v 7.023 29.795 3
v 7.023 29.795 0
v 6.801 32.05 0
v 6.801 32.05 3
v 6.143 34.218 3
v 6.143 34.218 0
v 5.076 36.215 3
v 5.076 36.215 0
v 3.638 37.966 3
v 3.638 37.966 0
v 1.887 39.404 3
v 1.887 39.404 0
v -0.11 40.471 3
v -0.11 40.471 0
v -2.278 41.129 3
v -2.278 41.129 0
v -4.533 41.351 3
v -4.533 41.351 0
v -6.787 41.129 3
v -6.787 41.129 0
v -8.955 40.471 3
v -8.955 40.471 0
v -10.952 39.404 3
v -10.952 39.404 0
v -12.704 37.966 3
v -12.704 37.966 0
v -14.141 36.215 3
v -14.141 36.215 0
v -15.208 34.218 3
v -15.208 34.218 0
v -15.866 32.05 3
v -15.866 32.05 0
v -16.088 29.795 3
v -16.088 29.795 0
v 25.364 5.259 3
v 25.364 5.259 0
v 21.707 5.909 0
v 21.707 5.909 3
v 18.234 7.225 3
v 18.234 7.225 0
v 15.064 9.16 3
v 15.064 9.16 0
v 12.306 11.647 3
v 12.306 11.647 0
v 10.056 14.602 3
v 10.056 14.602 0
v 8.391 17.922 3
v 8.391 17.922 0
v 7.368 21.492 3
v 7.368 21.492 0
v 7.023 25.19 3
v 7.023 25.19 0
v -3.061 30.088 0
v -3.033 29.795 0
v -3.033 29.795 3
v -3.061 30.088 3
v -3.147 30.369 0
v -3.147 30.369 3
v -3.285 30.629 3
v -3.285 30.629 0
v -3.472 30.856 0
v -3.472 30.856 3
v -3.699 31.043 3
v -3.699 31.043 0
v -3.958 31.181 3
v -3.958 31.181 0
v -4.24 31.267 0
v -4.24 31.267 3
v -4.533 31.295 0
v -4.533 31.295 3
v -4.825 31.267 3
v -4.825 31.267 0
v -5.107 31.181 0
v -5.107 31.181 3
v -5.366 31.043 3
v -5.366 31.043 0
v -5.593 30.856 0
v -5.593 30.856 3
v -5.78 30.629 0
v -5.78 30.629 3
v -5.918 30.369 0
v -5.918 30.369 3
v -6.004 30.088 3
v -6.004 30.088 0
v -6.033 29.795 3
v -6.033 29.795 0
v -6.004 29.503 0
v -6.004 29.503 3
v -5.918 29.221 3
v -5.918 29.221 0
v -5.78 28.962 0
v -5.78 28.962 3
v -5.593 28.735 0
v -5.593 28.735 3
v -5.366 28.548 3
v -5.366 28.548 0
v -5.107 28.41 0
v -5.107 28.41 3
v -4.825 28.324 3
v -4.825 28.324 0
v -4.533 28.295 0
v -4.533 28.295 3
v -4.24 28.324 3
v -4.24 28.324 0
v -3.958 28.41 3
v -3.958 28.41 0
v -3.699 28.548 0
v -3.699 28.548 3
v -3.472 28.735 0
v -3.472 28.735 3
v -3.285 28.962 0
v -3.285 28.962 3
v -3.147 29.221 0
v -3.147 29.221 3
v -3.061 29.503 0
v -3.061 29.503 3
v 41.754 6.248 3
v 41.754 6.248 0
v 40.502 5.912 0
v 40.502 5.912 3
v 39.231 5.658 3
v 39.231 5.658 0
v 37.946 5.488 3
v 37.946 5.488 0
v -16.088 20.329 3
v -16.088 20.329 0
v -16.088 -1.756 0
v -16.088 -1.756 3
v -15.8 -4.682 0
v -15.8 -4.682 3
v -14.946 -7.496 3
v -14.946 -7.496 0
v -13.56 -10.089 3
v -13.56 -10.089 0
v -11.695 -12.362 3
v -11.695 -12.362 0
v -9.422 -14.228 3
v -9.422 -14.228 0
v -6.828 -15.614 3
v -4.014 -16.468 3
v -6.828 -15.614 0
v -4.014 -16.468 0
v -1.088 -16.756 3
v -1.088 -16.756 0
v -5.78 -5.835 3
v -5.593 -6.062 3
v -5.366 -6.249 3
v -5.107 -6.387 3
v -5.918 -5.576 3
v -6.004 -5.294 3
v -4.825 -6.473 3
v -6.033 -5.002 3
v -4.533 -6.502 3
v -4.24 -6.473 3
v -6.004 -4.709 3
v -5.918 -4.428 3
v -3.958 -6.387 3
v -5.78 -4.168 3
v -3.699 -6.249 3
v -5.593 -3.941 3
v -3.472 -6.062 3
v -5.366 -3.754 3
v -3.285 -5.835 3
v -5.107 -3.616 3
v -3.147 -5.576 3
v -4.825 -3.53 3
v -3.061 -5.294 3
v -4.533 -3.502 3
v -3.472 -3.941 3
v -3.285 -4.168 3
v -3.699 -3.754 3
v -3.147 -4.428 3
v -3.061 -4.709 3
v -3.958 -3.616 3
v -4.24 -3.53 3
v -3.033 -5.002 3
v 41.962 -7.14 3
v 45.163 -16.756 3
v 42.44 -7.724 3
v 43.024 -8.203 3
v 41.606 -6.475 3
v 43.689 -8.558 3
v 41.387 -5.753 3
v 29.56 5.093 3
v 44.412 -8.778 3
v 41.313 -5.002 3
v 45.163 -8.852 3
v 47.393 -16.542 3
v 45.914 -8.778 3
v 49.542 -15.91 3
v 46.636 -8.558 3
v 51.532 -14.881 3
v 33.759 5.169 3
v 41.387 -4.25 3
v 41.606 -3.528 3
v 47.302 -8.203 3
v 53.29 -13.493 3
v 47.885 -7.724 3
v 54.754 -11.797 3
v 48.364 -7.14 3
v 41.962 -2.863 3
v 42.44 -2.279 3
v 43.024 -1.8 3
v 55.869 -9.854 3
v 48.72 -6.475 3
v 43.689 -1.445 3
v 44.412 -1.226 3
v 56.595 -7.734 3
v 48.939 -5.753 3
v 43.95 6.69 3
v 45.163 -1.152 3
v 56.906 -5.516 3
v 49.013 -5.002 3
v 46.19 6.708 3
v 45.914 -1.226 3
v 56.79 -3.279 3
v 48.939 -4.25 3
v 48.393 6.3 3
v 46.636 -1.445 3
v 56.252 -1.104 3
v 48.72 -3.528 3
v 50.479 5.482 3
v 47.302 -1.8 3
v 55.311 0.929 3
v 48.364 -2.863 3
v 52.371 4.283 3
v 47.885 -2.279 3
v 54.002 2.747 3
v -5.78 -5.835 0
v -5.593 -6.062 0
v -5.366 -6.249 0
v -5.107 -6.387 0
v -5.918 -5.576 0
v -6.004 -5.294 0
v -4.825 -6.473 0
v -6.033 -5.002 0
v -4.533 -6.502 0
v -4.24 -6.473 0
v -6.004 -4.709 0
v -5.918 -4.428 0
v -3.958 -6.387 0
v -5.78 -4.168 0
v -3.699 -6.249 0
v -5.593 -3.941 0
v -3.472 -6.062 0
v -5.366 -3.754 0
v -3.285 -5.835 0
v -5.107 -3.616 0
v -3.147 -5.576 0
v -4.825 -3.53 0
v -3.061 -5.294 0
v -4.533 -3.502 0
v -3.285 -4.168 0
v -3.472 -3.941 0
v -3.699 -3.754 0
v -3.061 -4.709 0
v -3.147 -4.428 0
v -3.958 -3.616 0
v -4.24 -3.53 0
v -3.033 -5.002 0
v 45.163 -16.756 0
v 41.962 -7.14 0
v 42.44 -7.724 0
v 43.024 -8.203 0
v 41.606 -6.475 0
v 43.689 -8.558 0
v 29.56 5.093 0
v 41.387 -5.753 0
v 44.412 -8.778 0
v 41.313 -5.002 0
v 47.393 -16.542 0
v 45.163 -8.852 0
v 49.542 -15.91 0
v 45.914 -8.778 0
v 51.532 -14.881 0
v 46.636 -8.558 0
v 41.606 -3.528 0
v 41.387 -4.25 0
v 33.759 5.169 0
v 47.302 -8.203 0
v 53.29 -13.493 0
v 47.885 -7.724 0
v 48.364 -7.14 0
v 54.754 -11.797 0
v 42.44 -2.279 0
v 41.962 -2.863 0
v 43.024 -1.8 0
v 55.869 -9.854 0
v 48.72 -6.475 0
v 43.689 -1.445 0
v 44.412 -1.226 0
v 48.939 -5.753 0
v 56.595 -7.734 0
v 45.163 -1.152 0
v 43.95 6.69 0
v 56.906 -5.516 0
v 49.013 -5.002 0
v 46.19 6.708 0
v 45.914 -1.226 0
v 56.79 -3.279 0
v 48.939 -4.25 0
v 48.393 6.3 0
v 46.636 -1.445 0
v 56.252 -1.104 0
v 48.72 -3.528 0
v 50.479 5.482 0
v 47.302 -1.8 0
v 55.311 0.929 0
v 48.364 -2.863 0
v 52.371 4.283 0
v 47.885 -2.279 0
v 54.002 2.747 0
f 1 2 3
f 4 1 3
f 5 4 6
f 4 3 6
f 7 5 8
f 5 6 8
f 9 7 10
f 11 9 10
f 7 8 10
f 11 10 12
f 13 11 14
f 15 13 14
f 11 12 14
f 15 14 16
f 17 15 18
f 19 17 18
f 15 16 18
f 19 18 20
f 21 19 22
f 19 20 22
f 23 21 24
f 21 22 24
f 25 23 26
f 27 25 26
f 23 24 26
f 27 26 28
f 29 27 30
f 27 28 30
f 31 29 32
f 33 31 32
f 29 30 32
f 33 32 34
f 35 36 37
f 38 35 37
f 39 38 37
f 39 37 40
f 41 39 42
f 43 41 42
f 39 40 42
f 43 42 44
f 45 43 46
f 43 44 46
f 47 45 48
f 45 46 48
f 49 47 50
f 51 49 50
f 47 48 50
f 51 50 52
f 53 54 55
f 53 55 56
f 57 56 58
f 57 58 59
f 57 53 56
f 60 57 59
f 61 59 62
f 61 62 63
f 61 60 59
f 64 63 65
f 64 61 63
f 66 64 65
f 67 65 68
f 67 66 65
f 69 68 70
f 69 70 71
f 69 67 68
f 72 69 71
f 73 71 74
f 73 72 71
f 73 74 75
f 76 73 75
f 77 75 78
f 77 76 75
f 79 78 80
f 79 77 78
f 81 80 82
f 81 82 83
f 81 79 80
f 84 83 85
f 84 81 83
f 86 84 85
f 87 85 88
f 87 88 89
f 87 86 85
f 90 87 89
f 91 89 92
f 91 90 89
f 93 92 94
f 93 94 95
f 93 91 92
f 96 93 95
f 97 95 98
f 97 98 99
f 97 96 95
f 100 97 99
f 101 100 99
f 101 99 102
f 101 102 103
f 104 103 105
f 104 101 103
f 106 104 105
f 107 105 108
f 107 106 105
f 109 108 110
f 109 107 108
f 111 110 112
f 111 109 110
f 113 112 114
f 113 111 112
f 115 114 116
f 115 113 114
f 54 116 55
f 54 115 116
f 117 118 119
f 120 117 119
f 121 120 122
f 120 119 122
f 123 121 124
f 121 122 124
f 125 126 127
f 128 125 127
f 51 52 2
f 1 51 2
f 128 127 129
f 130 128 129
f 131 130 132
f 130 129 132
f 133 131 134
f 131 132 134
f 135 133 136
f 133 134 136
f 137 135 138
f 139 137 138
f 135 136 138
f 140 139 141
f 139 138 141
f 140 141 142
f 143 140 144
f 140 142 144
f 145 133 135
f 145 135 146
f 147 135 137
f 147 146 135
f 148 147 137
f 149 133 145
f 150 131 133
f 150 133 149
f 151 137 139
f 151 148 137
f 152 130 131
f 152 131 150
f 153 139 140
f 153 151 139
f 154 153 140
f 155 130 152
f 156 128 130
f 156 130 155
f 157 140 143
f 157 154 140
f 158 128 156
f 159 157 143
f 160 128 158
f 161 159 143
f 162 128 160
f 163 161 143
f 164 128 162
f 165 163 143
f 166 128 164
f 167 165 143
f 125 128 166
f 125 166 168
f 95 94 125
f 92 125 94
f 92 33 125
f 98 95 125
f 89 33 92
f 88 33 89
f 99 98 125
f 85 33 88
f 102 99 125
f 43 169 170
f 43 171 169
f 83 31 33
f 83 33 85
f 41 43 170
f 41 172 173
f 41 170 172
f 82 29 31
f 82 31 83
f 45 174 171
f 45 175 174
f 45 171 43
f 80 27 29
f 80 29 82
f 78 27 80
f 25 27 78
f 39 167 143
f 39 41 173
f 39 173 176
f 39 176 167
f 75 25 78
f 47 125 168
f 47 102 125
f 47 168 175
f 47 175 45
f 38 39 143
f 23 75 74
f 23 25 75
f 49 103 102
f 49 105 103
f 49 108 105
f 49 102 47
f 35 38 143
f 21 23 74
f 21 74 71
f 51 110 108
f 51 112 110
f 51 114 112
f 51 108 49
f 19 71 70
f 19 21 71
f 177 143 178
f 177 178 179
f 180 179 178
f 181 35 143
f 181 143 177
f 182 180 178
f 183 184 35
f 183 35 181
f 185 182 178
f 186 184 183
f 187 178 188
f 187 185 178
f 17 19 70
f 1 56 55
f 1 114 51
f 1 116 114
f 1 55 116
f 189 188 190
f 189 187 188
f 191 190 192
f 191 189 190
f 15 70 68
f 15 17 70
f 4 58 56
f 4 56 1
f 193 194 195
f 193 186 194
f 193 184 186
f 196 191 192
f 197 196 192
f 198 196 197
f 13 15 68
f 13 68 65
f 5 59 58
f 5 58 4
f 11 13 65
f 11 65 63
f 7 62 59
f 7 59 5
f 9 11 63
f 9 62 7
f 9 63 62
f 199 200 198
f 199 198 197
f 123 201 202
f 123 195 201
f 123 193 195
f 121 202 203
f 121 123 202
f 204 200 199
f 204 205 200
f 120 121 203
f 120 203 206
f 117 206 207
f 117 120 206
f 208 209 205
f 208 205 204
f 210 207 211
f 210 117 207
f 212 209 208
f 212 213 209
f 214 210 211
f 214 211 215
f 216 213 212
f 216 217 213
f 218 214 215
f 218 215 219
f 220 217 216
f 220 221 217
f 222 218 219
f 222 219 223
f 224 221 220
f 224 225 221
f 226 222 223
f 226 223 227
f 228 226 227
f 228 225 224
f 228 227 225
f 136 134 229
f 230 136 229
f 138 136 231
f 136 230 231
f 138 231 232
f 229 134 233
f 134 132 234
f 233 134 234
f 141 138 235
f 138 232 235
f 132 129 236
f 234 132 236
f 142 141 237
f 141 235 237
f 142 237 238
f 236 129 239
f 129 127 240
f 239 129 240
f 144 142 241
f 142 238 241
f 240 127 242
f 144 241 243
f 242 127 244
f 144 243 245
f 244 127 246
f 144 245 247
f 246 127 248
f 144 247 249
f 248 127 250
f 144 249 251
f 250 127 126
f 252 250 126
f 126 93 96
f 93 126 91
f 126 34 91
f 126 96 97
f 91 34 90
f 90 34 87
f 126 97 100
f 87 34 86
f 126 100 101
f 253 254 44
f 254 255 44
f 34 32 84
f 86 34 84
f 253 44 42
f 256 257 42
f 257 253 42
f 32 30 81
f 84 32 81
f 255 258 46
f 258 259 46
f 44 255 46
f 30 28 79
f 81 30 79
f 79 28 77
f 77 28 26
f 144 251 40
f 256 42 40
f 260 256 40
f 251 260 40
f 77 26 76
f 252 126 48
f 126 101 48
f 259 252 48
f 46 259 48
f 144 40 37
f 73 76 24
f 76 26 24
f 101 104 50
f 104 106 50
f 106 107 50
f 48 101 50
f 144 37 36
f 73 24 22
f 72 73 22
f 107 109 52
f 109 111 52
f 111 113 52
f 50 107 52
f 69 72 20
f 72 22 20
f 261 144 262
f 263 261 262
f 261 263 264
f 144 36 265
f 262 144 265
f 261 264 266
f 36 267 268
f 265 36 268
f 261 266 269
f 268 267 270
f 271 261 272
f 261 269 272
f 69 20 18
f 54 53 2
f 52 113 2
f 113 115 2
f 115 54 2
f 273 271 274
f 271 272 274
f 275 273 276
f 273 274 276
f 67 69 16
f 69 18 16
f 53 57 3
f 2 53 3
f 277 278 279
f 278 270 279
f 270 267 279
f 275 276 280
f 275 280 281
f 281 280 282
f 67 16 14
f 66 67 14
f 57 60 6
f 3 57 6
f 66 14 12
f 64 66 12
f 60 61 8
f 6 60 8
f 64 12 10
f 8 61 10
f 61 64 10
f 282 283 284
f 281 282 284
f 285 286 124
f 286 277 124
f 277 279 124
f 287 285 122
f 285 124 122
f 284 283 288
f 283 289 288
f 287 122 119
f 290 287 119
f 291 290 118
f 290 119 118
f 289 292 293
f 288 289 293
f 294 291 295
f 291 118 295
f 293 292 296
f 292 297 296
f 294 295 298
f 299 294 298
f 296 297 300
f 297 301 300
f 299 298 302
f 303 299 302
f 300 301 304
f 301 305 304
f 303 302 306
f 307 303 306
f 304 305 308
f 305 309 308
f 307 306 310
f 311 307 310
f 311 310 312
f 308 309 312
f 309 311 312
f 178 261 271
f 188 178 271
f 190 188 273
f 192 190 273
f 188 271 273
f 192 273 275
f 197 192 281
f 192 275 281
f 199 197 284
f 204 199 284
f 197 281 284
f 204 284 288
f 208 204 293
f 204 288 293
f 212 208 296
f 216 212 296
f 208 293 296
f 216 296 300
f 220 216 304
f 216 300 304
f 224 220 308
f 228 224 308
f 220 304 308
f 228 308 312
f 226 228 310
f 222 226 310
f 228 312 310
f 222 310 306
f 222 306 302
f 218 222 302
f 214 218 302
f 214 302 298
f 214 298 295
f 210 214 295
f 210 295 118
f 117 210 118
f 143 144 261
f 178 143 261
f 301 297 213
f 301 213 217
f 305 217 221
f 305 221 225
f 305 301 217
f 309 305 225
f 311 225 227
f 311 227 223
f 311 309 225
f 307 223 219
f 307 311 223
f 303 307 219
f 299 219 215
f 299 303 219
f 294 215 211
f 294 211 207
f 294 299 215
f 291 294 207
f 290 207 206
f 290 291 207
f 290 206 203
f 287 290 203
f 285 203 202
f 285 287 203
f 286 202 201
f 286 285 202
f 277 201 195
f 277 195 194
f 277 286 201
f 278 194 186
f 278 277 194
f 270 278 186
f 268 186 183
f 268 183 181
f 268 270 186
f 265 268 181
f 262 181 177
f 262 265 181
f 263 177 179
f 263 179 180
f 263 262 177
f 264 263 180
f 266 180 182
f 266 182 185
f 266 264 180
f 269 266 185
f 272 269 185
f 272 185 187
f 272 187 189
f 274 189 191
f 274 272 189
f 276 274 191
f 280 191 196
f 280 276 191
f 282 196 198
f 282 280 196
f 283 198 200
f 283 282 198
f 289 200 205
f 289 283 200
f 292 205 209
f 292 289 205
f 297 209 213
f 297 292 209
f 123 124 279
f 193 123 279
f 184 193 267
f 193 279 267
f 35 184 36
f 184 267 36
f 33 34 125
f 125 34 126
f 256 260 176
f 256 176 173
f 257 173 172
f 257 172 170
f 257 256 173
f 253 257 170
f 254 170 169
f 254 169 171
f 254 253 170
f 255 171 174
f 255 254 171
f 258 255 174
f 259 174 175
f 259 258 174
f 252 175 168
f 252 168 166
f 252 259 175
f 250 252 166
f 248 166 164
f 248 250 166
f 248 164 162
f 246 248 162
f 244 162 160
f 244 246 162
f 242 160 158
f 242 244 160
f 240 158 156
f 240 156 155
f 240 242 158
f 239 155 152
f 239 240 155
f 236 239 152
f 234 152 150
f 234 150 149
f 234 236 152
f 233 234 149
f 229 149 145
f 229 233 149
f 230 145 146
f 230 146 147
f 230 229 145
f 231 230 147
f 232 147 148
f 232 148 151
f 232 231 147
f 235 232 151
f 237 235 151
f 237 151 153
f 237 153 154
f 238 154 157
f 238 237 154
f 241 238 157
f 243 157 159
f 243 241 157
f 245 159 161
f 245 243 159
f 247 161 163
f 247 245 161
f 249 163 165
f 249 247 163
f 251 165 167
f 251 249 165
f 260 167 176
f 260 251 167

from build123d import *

# Parameters (mm, degrees)
SKETCH_1_R      = 1.5
SKETCH_1_R_2    = 3.85
EXTRUDE_1_DEPTH = 3


with BuildPart() as part:
    # 草圖1 → 填料-伸長1 (new body)
    with BuildSketch(Plane.XY):
        with BuildLine():
            Line((-1.088072116, -16.755807147), (45.162709199, -16.755807147))
            ThreePointArc((45.162709199, -16.755807147), (56.790010388, -3.27850574), (41.753879517, 6.247592861))
            ThreePointArc((41.753879517, 6.247592861), (39.868271169, 5.774911831), (37.945680681, 5.487523562))
            ThreePointArc((37.945680681, 5.487523562), (31.659768337, 5.100288193), (25.363940234, 5.25901355))
            ThreePointArc((25.363940234, 5.25901355), (12.306009375, 11.647221283), (7.023040081, 25.190078877))
            Line((7.023040081, 25.190078877), (7.023039951, 29.795438865))
            ThreePointArc((7.023039951, 29.795438865), (-4.532515913, 41.350994164), (-16.088071721, 29.795438809))
            Line((-16.088071721, 29.795438809), (-16.088072116, 20.328730687))
            Line((-16.088072116, 20.328730687), (-16.088072116, -1.755807147))
            ThreePointArc((-16.088072116, -1.755807147), (-11.694673834, -12.362408864), (-1.088072116, -16.755807147))
        make_face()
        with Locations((-4.532515885, 29.795438328)):
            Circle(SKETCH_1_R, mode=Mode.SUBTRACT)
        with Locations((45.162709199, -5.00153318)):
            Circle(SKETCH_1_R_2, mode=Mode.SUBTRACT)
        with Locations((-4.532515885, -5.00153318)):
            Circle(SKETCH_1_R, mode=Mode.SUBTRACT)
    extrude(amount=EXTRUDE_1_DEPTH)


solid = part.part
